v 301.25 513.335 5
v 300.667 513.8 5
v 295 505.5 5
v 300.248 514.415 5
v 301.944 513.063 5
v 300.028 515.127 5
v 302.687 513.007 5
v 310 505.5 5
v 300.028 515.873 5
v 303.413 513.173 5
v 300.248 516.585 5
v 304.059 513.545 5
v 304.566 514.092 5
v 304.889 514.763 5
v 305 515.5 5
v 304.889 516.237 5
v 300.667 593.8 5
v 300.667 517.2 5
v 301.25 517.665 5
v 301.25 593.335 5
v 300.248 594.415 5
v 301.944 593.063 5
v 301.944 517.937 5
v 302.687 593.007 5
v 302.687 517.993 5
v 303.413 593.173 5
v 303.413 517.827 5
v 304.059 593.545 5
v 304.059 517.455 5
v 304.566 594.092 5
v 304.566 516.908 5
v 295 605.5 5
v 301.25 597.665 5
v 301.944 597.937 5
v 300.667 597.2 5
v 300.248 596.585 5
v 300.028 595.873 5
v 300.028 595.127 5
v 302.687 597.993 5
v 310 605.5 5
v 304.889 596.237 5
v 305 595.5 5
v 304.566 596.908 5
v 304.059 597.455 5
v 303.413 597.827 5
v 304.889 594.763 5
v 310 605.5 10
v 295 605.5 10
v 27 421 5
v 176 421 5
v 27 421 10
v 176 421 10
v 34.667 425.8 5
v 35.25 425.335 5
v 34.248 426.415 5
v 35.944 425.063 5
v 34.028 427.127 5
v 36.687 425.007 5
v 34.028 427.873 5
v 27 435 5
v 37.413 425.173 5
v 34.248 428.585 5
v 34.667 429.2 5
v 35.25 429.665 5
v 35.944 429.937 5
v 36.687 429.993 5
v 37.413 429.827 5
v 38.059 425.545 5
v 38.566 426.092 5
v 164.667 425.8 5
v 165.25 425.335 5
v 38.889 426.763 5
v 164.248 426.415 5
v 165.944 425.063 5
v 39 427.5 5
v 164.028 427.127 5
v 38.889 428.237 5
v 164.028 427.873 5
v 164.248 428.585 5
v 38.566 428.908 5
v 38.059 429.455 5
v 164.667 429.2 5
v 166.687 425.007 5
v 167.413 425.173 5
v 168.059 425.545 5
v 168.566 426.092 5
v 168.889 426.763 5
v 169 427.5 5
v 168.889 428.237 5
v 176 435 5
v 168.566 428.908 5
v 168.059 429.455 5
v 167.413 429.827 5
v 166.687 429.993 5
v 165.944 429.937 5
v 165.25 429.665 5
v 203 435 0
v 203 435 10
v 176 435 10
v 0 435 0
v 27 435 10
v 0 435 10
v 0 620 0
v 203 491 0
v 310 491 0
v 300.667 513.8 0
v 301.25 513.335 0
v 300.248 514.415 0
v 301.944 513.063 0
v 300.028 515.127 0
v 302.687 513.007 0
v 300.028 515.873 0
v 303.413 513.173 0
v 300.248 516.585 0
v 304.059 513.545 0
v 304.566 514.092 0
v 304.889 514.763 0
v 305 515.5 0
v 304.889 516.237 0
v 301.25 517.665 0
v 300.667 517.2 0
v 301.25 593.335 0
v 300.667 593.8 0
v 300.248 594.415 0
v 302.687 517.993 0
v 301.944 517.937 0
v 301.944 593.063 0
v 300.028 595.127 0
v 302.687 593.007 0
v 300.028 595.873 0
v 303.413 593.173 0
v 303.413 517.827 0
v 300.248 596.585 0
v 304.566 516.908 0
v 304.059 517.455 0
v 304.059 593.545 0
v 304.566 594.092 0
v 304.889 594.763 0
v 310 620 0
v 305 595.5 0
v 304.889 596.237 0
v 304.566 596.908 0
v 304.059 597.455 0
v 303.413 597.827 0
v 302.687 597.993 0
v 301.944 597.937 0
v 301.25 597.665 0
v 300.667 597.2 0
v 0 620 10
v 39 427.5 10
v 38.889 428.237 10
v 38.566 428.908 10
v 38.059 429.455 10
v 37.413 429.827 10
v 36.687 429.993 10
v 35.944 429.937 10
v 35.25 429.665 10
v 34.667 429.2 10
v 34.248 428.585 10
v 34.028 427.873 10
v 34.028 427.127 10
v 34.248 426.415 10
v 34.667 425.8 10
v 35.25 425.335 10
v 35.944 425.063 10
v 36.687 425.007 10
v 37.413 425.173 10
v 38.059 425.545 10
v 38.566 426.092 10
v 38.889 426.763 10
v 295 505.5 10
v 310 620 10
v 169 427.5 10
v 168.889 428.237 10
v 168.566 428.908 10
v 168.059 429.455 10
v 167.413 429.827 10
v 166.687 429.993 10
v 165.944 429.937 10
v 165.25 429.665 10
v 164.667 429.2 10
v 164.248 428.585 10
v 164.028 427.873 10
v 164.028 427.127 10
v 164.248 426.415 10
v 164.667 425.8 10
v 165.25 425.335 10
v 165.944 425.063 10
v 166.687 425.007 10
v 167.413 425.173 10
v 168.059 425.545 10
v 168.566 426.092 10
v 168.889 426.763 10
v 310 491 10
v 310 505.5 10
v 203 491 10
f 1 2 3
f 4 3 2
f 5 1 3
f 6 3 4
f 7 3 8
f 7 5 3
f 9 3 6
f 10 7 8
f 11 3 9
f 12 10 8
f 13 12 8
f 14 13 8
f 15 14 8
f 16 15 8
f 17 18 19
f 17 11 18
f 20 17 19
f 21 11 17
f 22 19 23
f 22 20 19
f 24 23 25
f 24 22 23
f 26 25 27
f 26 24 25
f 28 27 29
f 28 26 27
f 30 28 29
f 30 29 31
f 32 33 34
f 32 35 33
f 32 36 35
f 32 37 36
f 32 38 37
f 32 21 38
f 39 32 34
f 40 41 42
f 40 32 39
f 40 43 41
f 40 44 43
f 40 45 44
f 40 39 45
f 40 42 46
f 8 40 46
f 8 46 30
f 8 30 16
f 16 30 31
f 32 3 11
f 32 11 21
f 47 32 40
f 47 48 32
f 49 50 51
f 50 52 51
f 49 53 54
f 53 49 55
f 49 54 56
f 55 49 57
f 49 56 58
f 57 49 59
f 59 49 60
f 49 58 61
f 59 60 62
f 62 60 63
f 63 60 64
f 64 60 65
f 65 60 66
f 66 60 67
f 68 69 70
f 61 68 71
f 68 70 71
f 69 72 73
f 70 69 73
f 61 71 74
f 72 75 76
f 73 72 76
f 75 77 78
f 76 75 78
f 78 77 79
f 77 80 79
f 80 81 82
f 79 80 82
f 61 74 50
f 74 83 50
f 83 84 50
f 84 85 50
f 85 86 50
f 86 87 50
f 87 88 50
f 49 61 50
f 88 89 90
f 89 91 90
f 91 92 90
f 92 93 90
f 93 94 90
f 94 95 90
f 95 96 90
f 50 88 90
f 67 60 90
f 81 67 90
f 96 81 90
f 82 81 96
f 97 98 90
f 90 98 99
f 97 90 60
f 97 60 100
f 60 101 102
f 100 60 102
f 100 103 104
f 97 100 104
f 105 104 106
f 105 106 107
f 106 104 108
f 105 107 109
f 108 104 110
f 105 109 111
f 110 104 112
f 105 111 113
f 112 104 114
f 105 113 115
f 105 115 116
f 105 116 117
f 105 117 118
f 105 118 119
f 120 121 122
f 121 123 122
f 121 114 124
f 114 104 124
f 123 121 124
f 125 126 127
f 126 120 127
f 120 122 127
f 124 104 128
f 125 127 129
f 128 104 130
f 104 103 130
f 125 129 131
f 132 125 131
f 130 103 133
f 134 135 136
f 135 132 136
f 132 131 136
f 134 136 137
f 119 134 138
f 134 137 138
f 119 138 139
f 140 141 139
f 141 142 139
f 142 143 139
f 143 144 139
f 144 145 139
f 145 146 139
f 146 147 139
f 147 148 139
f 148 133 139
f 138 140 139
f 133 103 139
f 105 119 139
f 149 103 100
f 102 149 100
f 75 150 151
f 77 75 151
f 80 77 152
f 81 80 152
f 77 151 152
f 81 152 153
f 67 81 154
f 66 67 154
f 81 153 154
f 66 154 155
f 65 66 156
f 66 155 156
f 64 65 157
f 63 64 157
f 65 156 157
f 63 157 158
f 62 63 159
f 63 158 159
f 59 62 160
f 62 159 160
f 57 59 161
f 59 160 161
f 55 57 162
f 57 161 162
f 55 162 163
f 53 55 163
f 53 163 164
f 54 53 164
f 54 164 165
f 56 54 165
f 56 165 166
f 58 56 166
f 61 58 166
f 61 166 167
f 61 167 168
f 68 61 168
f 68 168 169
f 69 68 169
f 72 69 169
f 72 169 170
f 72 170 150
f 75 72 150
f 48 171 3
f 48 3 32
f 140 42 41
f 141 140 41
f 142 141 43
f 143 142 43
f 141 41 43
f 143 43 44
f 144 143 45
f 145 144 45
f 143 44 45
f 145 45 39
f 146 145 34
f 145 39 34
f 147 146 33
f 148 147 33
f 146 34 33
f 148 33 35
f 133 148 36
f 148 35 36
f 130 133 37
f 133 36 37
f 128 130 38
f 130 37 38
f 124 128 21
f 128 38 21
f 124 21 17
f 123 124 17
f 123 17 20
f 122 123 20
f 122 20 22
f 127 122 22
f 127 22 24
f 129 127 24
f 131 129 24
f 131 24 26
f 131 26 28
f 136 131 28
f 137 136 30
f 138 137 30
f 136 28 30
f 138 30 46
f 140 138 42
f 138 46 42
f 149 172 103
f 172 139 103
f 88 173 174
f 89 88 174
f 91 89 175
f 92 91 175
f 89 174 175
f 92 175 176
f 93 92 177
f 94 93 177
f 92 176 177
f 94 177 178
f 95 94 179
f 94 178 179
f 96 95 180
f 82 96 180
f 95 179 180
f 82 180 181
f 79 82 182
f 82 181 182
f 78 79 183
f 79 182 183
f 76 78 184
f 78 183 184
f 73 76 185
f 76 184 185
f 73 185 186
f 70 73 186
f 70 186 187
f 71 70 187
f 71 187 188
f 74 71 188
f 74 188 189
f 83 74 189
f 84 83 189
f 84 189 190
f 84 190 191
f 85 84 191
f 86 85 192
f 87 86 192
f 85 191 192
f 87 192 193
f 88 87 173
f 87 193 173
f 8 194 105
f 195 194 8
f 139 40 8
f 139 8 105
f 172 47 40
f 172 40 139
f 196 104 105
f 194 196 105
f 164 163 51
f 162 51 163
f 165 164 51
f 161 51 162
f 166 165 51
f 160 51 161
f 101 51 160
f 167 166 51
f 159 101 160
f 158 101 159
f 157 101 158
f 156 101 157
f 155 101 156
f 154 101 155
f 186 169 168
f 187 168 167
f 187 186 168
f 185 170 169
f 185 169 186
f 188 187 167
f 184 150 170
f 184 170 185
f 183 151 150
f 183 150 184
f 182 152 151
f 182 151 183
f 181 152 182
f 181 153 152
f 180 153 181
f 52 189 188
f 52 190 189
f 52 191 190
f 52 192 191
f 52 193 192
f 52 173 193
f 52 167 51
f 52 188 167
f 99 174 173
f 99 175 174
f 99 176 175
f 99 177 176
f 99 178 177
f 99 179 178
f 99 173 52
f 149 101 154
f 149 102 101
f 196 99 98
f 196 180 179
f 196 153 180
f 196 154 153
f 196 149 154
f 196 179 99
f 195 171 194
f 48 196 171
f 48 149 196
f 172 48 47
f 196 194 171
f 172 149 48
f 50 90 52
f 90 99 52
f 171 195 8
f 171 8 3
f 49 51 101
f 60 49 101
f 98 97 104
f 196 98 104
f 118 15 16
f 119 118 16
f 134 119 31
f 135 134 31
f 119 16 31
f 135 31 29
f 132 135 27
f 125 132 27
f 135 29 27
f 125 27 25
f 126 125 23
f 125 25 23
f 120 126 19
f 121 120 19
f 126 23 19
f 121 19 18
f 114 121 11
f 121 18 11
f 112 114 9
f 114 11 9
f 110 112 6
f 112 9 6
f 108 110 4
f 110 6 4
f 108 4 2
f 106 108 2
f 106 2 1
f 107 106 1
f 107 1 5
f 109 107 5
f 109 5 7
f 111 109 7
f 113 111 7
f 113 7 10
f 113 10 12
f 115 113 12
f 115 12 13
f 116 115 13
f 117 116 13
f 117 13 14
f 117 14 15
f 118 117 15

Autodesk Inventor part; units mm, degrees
ref_plane "YZ Plane" through (0, 0, 0) normal (1, 0, 0) x (0, 1, 0)
ref_plane "XZ Plane" through (0, 0, 0) normal (0, 1, 0) x (-1, 0, 0)
ref_plane "XY Plane" through (0, 0, 0) normal (0, 0, 1) x (1, 0, 0)
sketch "Sketch1" plane through (0, 0, 0) normal (0, 0, 1) x (1, 0, 0)
  line L0 (0, 0) -> (620, 0)
  line L1 (620, 0) -> (620, 620)
  line L2 (620, 620) -> (0, 620)
  line L3 (0, 620) -> (0, 0)
  line L4 (203, 491) -> (417, 491)
  line L5 (417, 491) -> (417, 377)
  line L6 (417, 377) -> (203, 377)
  line L7 (203, 377) -> (203, 491)
  point P0 (310, 491)
  point P1 (310, 620)
  dimension "d0" = 620
  dimension "d1" = 620
  dimension "d2" = 214
  dimension "d3" = 114
  dimension "d4" = 129
extrude "Extrusion1" add sketch "Sketch1" along normal blind 10
sketch "Sketch2" plane through (0, 0, 10) normal (0, 0, 1) x (1, 0, 0)
  line L0 (0, 0) -> (310, 0)
  line L1 (310, 0) -> (310, 435)
  line L2 (310, 435) -> (0, 435)
  line L3 (0, 435) -> (0, 0)
  line L4 (620, 620) -> (0, 620) projected
  line L5 (0, 435) -> (620, 435)
  line L6 (620, 435) -> (620, 620)
  line L7 (620, 620) -> (0, 620)
  line L8 (0, 620) -> (0, 435)
  line L9 (310, 435) -> (620, 435)
  line L10 (620, 435) -> (620, 0)
  line L11 (620, 0) -> (310, 0)
  line L12 (310, 0) -> (310, 435)
  line L13 (620, 435) -> (310, 435)
  line L14 (310, 435) -> (310, 620)
  line L15 (310, 620) -> (620, 620)
  line L16 (620, 620) -> (620, 435)
  dimension "d7" = 435
extrude "Extrusion2" cut sketch "Sketch2" against normal through all contours L3 L2 L1 L0 | L1 L5 L10 L11 | L14 L4 L6 L5
sketch "Sketch6" plane through (0, 0, 10) normal (0, 0, 1) x (1, 0, 0)
  line L0 (310, 491) -> (310, 620) projected
  line L1 (310, 505.5) -> (295, 505.5)
  line L2 (295, 505.5) -> (295, 605.5)
  line L3 (295, 605.5) -> (310, 605.5)
  line L4 (310, 605.5) -> (310, 505.5)
  point P0 (0, 0)
  point P1 (310, 555.5)
  dimension "d30" = 15
  dimension "d31" = 100
extrude "Extrusion6" cut sketch "Sketch6" against normal blind 5
sketch "Sketch7" plane through (0, 0, 5) normal (0, 0, 1) x (1, 0, 0)
  line L0 (310, 605.5) -> (310, 505.5) construction
  line L1 (295, 605.5) -> (310, 605.5) construction
  line L2 (295, 505.5) -> (295, 605.5) construction
  line L3 (310, 505.5) -> (295, 505.5) construction
  circle A0 centre (302.5, 515.5) radius 2.5
  circle A1 centre (302.5, 595.5) radius 2.5
  point P0 (0, 0)
  point P1 (302.5, 605.5)
  point P2 (302.5, 505.5)
  dimension "d36" = 5
  dimension "d37" = 5
  dimension "d38" = 10
  dimension "d39" = 10
extrude "Extrusion7" cut sketch "Sketch7" against normal through all
sketch "Sketch8" plane through (0, 0, 10) normal (0, 0, 1) x (1, 0, 0)
  line L0 (203, 435) -> (0, 435) projected
  line L1 (27, 435) -> (176, 435)
  line L2 (176, 435) -> (176, 421)
  line L3 (176, 421) -> (27, 421)
  line L4 (27, 421) -> (27, 435)
  line L5 (26.5, 435) -> (176.5, 435) construction
  line L6 (176.5, 435) -> (176.5, 420) construction
  line L7 (176.5, 420) -> (26.5, 420) construction
  line L8 (26.5, 420) -> (26.5, 435) construction
  line L9 (0, 435) -> (203, 435) projected
  circle A0 centre (36.5, 427.5) radius 2.5
  circle A1 centre (166.5, 427.5) radius 2.5
  point P0 (0, 0)
  point P1 (101.5, 435)
  point P2 (101.5, 435)
  point P3 (176.5, 427.5)
  point P4 (26.5, 427.5)
  dimension "d44" = 149
  dimension "d45" = 14
  dimension "d46" = 150
  dimension "d47" = 15
  dimension "d48" = 5
  dimension "d49" = 5
  dimension "d50" = 10
  dimension "d51" = 10
extrude "Extrusion8" add sketch "Sketch8" against normal blind 5
properties part number "TC001b" material "ABS Plastic"
